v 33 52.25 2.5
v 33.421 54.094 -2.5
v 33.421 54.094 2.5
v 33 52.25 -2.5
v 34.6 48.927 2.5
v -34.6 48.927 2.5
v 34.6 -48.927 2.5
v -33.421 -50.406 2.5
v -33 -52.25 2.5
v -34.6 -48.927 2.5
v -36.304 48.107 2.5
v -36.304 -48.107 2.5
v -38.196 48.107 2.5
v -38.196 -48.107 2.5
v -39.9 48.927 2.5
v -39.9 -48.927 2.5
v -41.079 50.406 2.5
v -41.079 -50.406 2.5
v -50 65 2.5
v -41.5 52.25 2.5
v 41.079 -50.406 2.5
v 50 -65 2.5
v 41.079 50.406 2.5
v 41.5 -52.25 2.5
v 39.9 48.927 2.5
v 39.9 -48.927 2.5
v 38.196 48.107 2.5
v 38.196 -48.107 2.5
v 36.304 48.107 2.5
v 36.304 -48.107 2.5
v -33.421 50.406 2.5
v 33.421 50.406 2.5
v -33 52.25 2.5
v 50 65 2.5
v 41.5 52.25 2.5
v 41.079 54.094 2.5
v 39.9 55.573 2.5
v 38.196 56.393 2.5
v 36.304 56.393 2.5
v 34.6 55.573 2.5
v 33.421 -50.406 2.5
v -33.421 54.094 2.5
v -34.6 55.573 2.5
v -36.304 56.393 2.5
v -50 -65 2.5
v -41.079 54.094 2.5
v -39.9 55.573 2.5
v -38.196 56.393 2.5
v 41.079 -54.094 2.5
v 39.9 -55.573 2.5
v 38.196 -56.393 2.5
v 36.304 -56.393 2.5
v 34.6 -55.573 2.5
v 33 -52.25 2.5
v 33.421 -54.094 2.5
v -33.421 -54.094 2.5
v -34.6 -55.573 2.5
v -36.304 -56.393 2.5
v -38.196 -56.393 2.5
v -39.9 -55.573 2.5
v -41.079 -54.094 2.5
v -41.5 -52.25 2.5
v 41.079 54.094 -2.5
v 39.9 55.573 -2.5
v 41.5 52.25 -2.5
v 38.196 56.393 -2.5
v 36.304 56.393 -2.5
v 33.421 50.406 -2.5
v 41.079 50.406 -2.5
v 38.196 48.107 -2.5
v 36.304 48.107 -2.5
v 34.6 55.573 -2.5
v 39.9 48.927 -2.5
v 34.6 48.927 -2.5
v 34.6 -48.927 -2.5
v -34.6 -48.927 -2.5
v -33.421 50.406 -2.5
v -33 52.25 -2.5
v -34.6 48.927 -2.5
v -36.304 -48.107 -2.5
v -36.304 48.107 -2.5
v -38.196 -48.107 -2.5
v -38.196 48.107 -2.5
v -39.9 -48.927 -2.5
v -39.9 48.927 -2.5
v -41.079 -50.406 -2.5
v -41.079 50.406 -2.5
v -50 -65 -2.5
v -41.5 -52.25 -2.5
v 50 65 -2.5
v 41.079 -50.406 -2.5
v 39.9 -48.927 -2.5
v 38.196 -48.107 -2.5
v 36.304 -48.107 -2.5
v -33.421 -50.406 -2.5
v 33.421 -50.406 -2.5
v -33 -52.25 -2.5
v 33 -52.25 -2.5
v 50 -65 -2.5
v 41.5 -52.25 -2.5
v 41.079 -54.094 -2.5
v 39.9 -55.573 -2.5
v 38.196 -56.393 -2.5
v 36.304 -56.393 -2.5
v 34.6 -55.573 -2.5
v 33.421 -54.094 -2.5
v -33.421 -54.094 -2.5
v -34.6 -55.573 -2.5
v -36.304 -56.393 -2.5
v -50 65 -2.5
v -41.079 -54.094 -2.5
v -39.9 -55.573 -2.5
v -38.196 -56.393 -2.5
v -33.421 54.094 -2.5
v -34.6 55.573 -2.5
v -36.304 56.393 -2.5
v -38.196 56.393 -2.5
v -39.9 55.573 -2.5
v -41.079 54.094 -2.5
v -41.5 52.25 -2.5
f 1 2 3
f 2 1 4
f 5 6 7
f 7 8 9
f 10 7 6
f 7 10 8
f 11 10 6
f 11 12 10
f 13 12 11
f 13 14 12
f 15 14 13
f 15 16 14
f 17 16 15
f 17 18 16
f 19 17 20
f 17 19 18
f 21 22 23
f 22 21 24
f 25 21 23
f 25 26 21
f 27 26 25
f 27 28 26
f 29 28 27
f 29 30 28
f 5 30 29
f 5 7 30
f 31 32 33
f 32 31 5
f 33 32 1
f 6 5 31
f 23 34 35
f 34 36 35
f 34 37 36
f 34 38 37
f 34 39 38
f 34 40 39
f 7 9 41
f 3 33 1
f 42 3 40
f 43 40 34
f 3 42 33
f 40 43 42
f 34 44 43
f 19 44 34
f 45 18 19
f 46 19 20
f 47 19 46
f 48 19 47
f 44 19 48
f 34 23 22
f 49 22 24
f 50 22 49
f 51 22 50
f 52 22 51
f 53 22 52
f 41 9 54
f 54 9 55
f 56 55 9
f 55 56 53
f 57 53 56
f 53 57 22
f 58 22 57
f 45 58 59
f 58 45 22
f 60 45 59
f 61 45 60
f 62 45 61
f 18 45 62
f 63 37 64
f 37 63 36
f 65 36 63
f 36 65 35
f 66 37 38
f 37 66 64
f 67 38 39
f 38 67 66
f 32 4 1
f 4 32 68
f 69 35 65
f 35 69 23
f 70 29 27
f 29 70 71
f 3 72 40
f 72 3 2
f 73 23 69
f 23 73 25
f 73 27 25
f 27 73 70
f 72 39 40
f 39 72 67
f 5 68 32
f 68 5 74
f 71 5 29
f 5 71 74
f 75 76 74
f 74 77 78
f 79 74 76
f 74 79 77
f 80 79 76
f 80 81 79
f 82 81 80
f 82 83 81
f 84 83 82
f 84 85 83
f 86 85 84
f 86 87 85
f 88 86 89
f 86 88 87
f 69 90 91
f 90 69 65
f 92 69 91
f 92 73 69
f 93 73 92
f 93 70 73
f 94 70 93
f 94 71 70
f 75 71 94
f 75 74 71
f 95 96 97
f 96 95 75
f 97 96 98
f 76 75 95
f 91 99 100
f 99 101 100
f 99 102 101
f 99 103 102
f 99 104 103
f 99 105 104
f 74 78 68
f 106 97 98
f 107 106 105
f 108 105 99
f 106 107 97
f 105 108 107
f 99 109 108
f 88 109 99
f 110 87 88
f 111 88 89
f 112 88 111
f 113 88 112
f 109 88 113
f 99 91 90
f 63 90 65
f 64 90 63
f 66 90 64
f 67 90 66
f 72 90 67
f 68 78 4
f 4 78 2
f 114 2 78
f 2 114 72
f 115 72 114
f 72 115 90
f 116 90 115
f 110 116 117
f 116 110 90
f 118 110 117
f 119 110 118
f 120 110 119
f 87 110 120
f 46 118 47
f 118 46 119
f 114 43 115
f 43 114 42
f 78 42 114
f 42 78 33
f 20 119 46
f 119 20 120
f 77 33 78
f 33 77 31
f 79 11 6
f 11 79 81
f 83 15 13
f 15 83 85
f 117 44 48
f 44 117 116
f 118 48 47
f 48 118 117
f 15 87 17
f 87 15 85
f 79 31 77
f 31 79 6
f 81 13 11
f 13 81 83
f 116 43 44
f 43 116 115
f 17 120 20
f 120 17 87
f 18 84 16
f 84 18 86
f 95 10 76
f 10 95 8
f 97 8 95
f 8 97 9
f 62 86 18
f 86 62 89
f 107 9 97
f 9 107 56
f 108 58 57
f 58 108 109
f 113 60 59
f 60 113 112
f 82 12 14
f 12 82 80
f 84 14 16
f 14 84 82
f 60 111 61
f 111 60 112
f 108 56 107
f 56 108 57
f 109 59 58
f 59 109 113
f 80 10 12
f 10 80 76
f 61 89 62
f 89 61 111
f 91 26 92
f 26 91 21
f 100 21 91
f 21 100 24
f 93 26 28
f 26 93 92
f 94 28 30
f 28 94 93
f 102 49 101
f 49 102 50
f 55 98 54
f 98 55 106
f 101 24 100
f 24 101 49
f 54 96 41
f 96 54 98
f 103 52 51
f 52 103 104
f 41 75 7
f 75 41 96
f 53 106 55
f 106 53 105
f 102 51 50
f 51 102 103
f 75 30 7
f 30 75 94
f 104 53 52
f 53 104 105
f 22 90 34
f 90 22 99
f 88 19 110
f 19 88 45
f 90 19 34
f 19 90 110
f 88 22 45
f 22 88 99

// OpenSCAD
// Generated by SolidPython 1.1.3 on 2023-01-09 23:21:47


difference() {
	cube(center = true, size = [100, 130.0000000000, 5]);
	union() {
		translate(v = [37.2500000000, 52.2500000000]) {
			cylinder(center = true, h = 5, r = 4.2500000000);
		}
		translate(v = [-37.2500000000, 52.2500000000]) {
			cylinder(center = true, h = 5, r = 4.2500000000);
		}
		translate(v = [-37.2500000000, -52.2500000000]) {
			cylinder(center = true, h = 5, r = 4.2500000000);
		}
		translate(v = [37.2500000000, -52.2500000000]) {
			cylinder(center = true, h = 5, r = 4.2500000000);
		}
	}
}
/***********************************************
*********      SolidPython code:      **********
************************************************
 
import solid
import numbers
import pudb
from solid.utils import *
import viewscad
import subprocess
import os
import os.path as osp
import math
import sys

chamfer_extrude=solid.import_scad("./chamfer_extrude.scad")
chamfer_extrude=chamfer_extrude.chamfer_extrude
r = viewscad.Renderer(width=800, height=800)

def debug(model,f_name,path="/home/ts/code/projects/mfd/designs/debug"):
    solid.scad_render_to_file(model,osp.join(path,f_name)+".scad")
#generate position list of wells using offset from center
wells_pos_from_center_4 = lambda offset: [[-offset,offset],
                                        [offset, offset],
                                        [-offset, -offset],
                                        [offset, -offset]]
#wells_pos_from_center_2 = lambda offset: [[0,offset],
#                                        [0, -offset]]
wells_pos_from_center_2 = lambda offset: [[offset,0],
                                        [-offset,0]]

def make_well(dims,shape=None,height=None,dxf=False):
    def circle_cylinder():
        if dxf or (height is None):
            well = solid.circle(r=dims, segments=64)
        else:
            well = solid.cylinder(r=dims, h=height, segments=64, center = True)
        return well
    if dims is None:
        sys.exit("radius needs to be a number")
    if isinstance(dims, numbers.Number):
        well =circle_cylinder()
    elif len(dims)==1:
        if isinstance(dims[1], numbers.Number):
            well =circle_cylinder()
        else:
            sys.exit("radius needs to be a number")
    elif len(dims)==2:
        well = solid.square(dims,center = True)
    elif len(dims)==3:
        well = solid.cube(dims, center = True)
    return well

def wells_top_bottom(center_gap,device_dims=None,shape=None,height=None, positions = None, dxf = False):
    well_shape = make_well(device_dims,shape=shape,height=height,dxf=dxf)
    wells = []
    if positions is None:
        offset = radius+radius/2.0
        positions = wells_pos_from_center_2(offset)
    if dxf or (height is None):
        height = 0
    for position in positions:
        if dxf:
            wells.append(solid.translate([position[0],position[1]])(well_shape))
        else:
            wells.append(solid.translate([position[0],position[1],height/2.0])(well_shape))
    return  union()(*wells)

#place wells in four corners 
def four_corner(radius,height=None, positions = None, dxf = False):
    #if well pos not specified set
    #to equally spaced by half radius
    if positions is None:
        offset = radius+radius/2.0
        positions = wells_pos_from_center_4(offset)
    if dxf or (height is None):
        height = 0
    #make wells at positions with specified radius and height
    wells = []
    for position in positions:
        #make circle if making dxf
        if dxf:
            well_shape = solid.circle(r=radius, segments=64)
            well_shape = solid.translate([position[0],position[1]])(well_shape)
        #if stl make cylinder
        else:
            well_shape = solid.cylinder(r=radius, h=height, segments=64, center = True)
            well_shape = solid.translate([position[0],position[1],height/2.0])(well_shape)
        wells.append(well_shape)
    return  union()(*wells)

#generate channels 
def make_channels(length,width,height=0,num_chans=1,max_chans=None,spacing=None, dxf = False,
                  rotate_channels=False):
    if dxf or (height is None):
        height = 0
    #if channel gap not defined, is equal to
    if spacing is None: spacing = width
    #calculate number of channels if fitting max num within given width
    if not max_chans is None:
        import math
        num_chans = math.floor((max_chans-spacing)/(width+spacing))
    #get total width of channel section  
    total_width = (width*num_chans)+(spacing*(num_chans-1))

    #make template channel
    #if rotate_channels: width, length = length, width
    if dxf:
        channel_t = solid.square([length,width],center = True)
    else:
        channel_t = solid.cube([length,width,height], center = True)

    #if number channels is even, offset the first channel to center its gap
    if num_chans % 2 == 0: centering = -(width/2.0+spacing/2.0)
    else: centering = 0
    #move template channel up to align bottom at z = 0 
    #and offset center if necessary
    if dxf:
        channel_t = solid.translate([0,centering])(channel_t)
    else:
        channel_t = solid.translate([0,centering,height/2.0])(channel_t)

    #if rotate_channels: length,width = width,length
    #start making the channels
    channels = []
    for i in range(num_chans):
        #if i=0 there is no translation
        #if i=1, we make the first channel adjacent to second
        direction = i

        #if i>=1, we add channels alternating left and right
        if i >= 1:
            direction = -(i/2.0)
            if i % 2 == 1: direction = (-direction)+0.5
                
        #make channel at right position and add it to channel list
        translation_coords = [0,direction*(width+spacing)]
        #if rotate_channels: translation_coords = [direction*(width+spacing),0]
        if dxf:
            channel = solid.translate(translation_coords)(channel_t)
        else:
            channel = solid.translate([*translation_coords,0])(channel_t)
        channels.append(channel)
    
    #group all channels as one object
    channels = union()(*channels)
    #compute the x,y,z dimensions in order to pass as arguments 
    #for construction of other parts of device (such as the chambers)
    measurements = {'x':(length/2.0,-length/2.0),
                    'y':(total_width/2.0,-total_width/2.0)}
    if not dxf:
        measurements['z'] = (height,0)
    if rotate_channels:
        channels = solid.rotate(90)(channels)
        measurements['x'],measurements['y']=measurements['y'],measurements['x']
    return channels,measurements

def make_chambers(msrs,height=None,extra=0,len_until=None,width=None, dxf = False):
    #computes x,y,z length
    total = lambda x : abs(x[0]) + abs(x[1])
    
    #if specific height if specified
    #otherwise use same height as channels
    if dxf:
        pass
    elif not height is None:
        msrs['z'] = (height,0)
    else:
        msrs['z'] = (0,0)
        
    #make copy of measurements from channels to modify chamber dimensions 
    #and add length to chambers as specified
    chamber_dims = msrs.copy()
    #calculate length of chamber to reach specified offset
    if not len_until is None:
        chamber_len = len_until-(msrs['x'][0])
    #or add specified length to channel length (if not specified, adds 0)
    else:
        chamber_len = msrs['x'][0]+extra
    #set the chamber length based 
    chamber_dims['x'] = (chamber_len/2.0,-(chamber_len/2.0))
    #compute final dimensions of chamber
    if not width is None:
        chamber_dims['y'] = (width/2.0,-width/2.0)
    chamber_dims = [total(size) for size in chamber_dims.values()]
        
    #calculate chamber translation offset to place adjacent to channels
    chamber_trslt = msrs['x'][0]+(chamber_len/2.0)
    #compute chamber translation coordinates to align with channels
    #x = 1 moves chamber above channels
    #x = -1 moves chamber below channels
    if dxf:
        trslt = lambda x : [x*(chamber_trslt),0]
    else:
        trslt = lambda x : [x*(chamber_trslt),0,msrs['z'][0]/2.0]
    
    #function to make chamber at top or at bottom 
    if dxf:
        move = lambda x : solid.translate(trslt(x))(solid.square(chamber_dims, center = True) )
    else:
        move = lambda x : solid.translate(trslt(x))(solid.cube(chamber_dims,center = True))
    #make top and bottom chambers and return them as grouped
    top = move(1)
    bottom = move(-1)
    #chambers=solid.rotate(90)(solid.union()(top,bottom))
    chambers=(solid.union()(top,bottom))

    return chambers

#create alignment features 
def alignment_features(unit,dims,grid_size, mask_size = None, alignment = "hollow", units_from_center = (2.5,2.5), corner_len=None):
    width = grid_size[0]*dims[0]
    length = grid_size[1]*dims[1]
    if mask_size is None and corner_len is None:
        corner_len = (dims[0] + dims[1]) /2 / 8
    corner = lambda thickness_div : solid.union()( solid.square([corner_len,corner_len/thickness_div],center=False), solid.square([corner_len/thickness_div,corner_len],center=False) )
    
    def make_full(thickness_div):
        thickness = corner_len/thickness_div
        tr = solid.translate([0, 0, 0 ])(solid.rotate(180)(corner(thickness_div)))
        tr = solid.translate([thickness/2,thickness/2,0])(tr)
        bl = solid.translate([0, 0, 0 ])(solid.rotate(0)(corner(thickness_div)))
        bl = solid.translate([-thickness/2,-thickness/2,0])(bl)
        return solid.union()(tr,bl)
    
    def make_hollow(thickness_div):
        thickness = corner_len/(thickness_div/2)
        inner = make_full(thickness_div)
        outer = make_full(thickness_div/2)
        hollow = outer - inner 
        return hollow
    
    center = (width /2 , length/2)
    mask_pos = lambda x,y : (center[0] + x*(float(units_from_center[0])*dims[0]), center[1] + y*(float(units_from_center[1])*dims[1]))
    positions = []
    positions.append(mask_pos(1,0))
    positions.append(mask_pos(0,1))
    positions.append(mask_pos(-1,0))
    positions.append(mask_pos(0,-1))
    make_mask = lambda mtype : make_hollow(8) if mtype == "hollow" else make_full(8)
    masks = [ solid.translate([*position,0])(make_mask(alignment)) for position in positions]
    
    solid.scad_render_to_file(solid.union()(*masks),"./designs/open_chamber/masks.scad")
    #return unit - solid.union()(*masks)
    return solid.union()(*masks,unit)

def create_outline(thickness, array, dims, grid_size,):
    width = grid_size[0]*dims[0] + thickness *2
    length = grid_size[1]*dims[1] + thickness *2
    outer = solid.translate([-thickness, -thickness,0])(solid.square([width, length]))
    return outer-array

def create_wall(wall_thickness, outline_thickness, dims, grid_size, wall_height = 2000, dxf = False):
    inner_width = grid_size[0]*dims[0] + outline_thickness *2
    inner_length = grid_size[1]*dims[1] + outline_thickness *2
    outer_width = inner_width + wall_thickness * 2
    outer_length = inner_length + wall_thickness * 2
    outer_pos_x = -outline_thickness-wall_thickness
    outer_pos_y = -outline_thickness-wall_thickness
    inner_pos_x = -outline_thickness
    inner_pos_y = -outline_thickness
    if dxf:
        inner_wall = solid.translate([inner_pos_x,
                                      inner_pos_y,
                                      0])(solid.square([inner_width, inner_length]))
        outer_wall = solid.translate([outer_pos_x,
                                      outer_pos_y,
                                      0])(solid.square([outer_width, outer_length]))

        return outer_wall-inner_wall
    else:
        inner_wall = solid.translate([inner_pos_x,
                                      inner_pos_y,
                                      0])(solid.cube([inner_width, inner_length,wall_height]))
        outer_wall = solid.translate([outer_pos_x,
                                      outer_pos_y,
                                      0])(solid.cube([outer_width, outer_length,wall_height]))

        return outer_wall-inner_wall, {'wall_height': wall_height,
                                       'wall_thickness': wall_thickness,
                                       'inner_width':inner_width,
                                       'inner_length': inner_length,
                                       'outer_width': outer_width,
                                       'outer_length': outer_length,
                                       'outer_pos_x' : outer_pos_x,
                                       'outer_pos_y' : outer_pos_y,
                                       'inner_pos_x' : inner_pos_x,
                                       'inner_pos_y' : inner_pos_y}

def create_thicker_wall(wall_thickness, outer_wall_offset, wall_dims, dims, grid_size, height_start = .2, height_end=2, dxf = False):
    addon_wall,thicker_wall_dims = create_wall(wall_thickness, outer_wall_offset, dims, grid_size, wall_height=height_end-height_start, dxf = False)
    addon_wall = solid.translate([0,0,height_start])(addon_wall)

    thicker_wall_dims['wall_height'] = height_end
    thicker_wall_dims['wall_thickness'] = wall_dims['wall_thickness'] + wall_thickness
    return addon_wall, thicker_wall_dims
 
def add_lock_to_wall(wall,wall_dims,y_offset = 0,cut_ratio=0.7,L_length=3, gap_ratio=0.05, axis="x",width_ratio=1/2):
    # Makes L shape
    def make_L(max_length,length_thickness,max_width,width_thickness,height,y_offset):
        length = solid.cube([max_length,length_thickness,height])
        width = solid.cube([width_thickness,max_width,height])
        width = solid.translate([max_length-(width_thickness),0,0])(width)
        L = solid.union()(width,length)
        debug(L,"L")
        if axis == "x":
            L = solid.rotate(-90)(L)
            L = solid.translate([0,max_length,0])(L)
        else:
            L = solid.rotate(-180)(L)
            L = solid.translate([max_length,max_width,0])(L)
        return solid.translate([0,0,y_offset])(L)
    
    lock_length = L_length
    lock_width = wall_dims['wall_thickness']*width_ratio
    lock_length_thickness = lock_width/2
    lock_width_thickness = lock_width/2
    L_lock = make_L(lock_length,lock_length_thickness,lock_width,lock_width_thickness, wall_dims['wall_height']-y_offset, y_offset)
    
    margin_space = lock_length - lock_length*(1-gap_ratio)
    key_length = lock_length-margin_space
    key_length_thickness = lock_length_thickness-(margin_space*2)
    key_width = lock_width-(margin_space*2)
    key_width_thickness = lock_width_thickness-(margin_space*2)
    L_key = make_L(key_length,key_length_thickness,key_width,key_width_thickness, wall_dims['wall_height']-y_offset, y_offset)
    L_key = solid.translate([margin_space,margin_space,0])(L_key)
    L = solid.union()(L_lock,L_key)
    debug(L,"L")
    
    #Make cube to be used as negative to split frame in a half
    #Can choose if making left or right negative, specify ratio of split
    def make_negative(right,cut_ratio):
        if axis == "x":
            if right:
                length = wall_dims['outer_length']*(1-cut_ratio)
                pos_x = wall_dims['outer_pos_x']+(wall_dims['outer_length']*cut_ratio)
            else:
                length = wall_dims['outer_length']*(cut_ratio)
                pos_x = wall_dims['outer_pos_x'] 
            negative = solid.cube([wall_dims['outer_width'],length, wall_dims['wall_height']])
            negative = solid.translate([wall_dims['outer_pos_y'],pos_x,0])(negative)
        else:
            if right:
                length = wall_dims['outer_width']*(1-cut_ratio)
                pos_x = wall_dims['outer_pos_y']+(wall_dims['outer_width']*cut_ratio)
            else:
                length = wall_dims['outer_width']*(cut_ratio)
                pos_x = wall_dims['outer_pos_y'] 
            negative = solid.cube([length,wall_dims['outer_length'], wall_dims['wall_height']])
            negative = solid.translate([pos_x,wall_dims['outer_pos_x'],0])(negative)
        return negative, pos_x, length 
                      
    #Make negatives
    negative_right, right_half_pos_x, right_half_length = make_negative(True,cut_ratio)
    negative_left, left_half_pos_x, right_half_length = make_negative(False,cut_ratio)
    #Make halves
    left_half = solid.difference()(wall,negative_right)
    right_half = solid.difference()(wall,negative_left)
    def place_L(L, L_length,L_width):
        #Place L on top wall       
        offset_to_center = (wall_dims['wall_thickness']-L_width)/2
        if axis == "x":
            y_pos_top = (wall_dims['outer_pos_y'] +
                    wall_dims['outer_width'] - 
                    L_width - offset_to_center)
            top_L = solid.translate([y_pos_top,
                                     right_half_pos_x-(L_length),
                                     0])(L)
            #Place L on bottom wall       
            y_pos_bottom = wall_dims['outer_pos_y']+offset_to_center
            bottom_L = solid.translate([y_pos_bottom,
                                        right_half_pos_x-L_length,
                                        0])(L)
        else:
            y_pos_top = (wall_dims['outer_pos_x'] +
                    wall_dims['outer_length'] -
                    (L_width+offset_to_center))
            top_L = solid.translate([right_half_pos_x-L_length,
                                     y_pos_top,
                                     0])(L)
            #Place L on bottom wall       
            y_pos_bottom = wall_dims['outer_pos_y']+offset_to_center
            bottom_L = solid.translate([right_half_pos_x-L_length,
                                        y_pos_bottom,
                                        0])(L)
        return bottom_L, top_L
    #Make complimentary L pieces through union and differences
    #Make Lock
    bottom_L_lock, top_L_lock = place_L(L_lock,L_length,lock_width)
    left_half = solid.difference()(left_half,bottom_L_lock)
    left_half = solid.difference()(left_half,top_L_lock)
    #Make Key
    bottom_L_key, top_L_key = place_L(L_key,L_length,lock_width)
    right_half = solid.union()(right_half,bottom_L_key)
    right_half = solid.union()(right_half,top_L_key)
    return left_half, right_half


#build a row x col grid of containment units
def make_unit_array(unit,dims,grid_size, dxf = False, alignment = None, mask_size = None,
                    units_from_center = None,alignment_offset=None, alignment_mark_size=1):
    units = []
    for col in range(grid_size[1]):
        for row in range(grid_size[0]):
            if dxf:
                units.append(solid.translate([row*dims[0],col*dims[1]])(unit))
            else:
                units.append(solid.translate([row*dims[0],col*dims[1],dims[2]/2.0])(unit))
    array = solid.union()(*units)
    if (not alignment is None) and dxf:
        if not alignment_offset is None:
            array = solid.translate([alignment_offset[0],alignment_offset[1]])(array)
        array = alignment_features(array,dims, grid_size, alignment = alignment, mask_size = None, units_from_center = units_from_center,corner_len=alignment_mark_size)
        if not alignment_offset is None:
            array = solid.translate([-alignment_offset[0],-alignment_offset[1]])(array)
    return array


def make_taylor(wells_pos = wells_pos_from_center_4(2.25), well_rad = 1.5 ,
                well_height = 2, chan_w = 0.01, chan_l = 1, chan_h = 0.010 ,
                chan_gap = 0.040, max_chans = None,num_chans=100, chamber_height  = 0.100,
                columns = 1, rows = 1, chamber_len_until=2.25, add_channels = True, add_wells = True, 
                add_chambers = True, save_path = "./", alignment = None, units_from_center = 2,
                mask_size = None, render_stl = False, outline_thickness = 0.050, dxf = True,
                wall_height = 15, wall_thickness = 0.95, casing_x=9, casing_y=9, casing_z=0,rotate_units=0):

    dims = [casing_x, casing_y, casing_z]
    wells = four_corner(well_rad,well_height, dxf = dxf, positions = wells_pos)
    debug(wells,"wells")
    channels, msrs = make_channels(chan_l,chan_w,chan_h,dxf=dxf, spacing = chan_gap, max_chans=max_chans,num_chans=num_chans)
    debug(channels,"channels")
    chambers = make_chambers(msrs,dxf = dxf, height=chamber_height,len_until=chamber_len_until)
    debug(chambers,"chambers")

    #add together and render
    device_parts = []
    if add_channels:
        device_parts.append(channels)
    if add_wells:
        device_parts.append(wells)
    if add_chambers:
        device_parts.append(chambers)
    device=union()(*device_parts)
    device = rotate(rotate_units)(device)

    device=solid.translate([dims[0]/2.0,dims[1]/2.0,0])(device)
    channels = rotate(rotate_units)(channels)
    channels=solid.translate([dims[0]/2,dims[1]/2,0])(channels)
    chambers_wells = union()(wells,chambers)
    chambers_wells = rotate(rotate_units)(chambers_wells)
    chambers_wells=solid.translate([dims[0]/2,dims[1]/2,0])(chambers_wells)

    file_name = str(rows)+'x'+str(columns)+'_units_'
    grid_size = [rows,columns]

    if alignment:
        alignment="full"
    device = make_unit_array(device,dims,grid_size, dxf=dxf, alignment = alignment,
                                 units_from_center = units_from_center)
    channels = make_unit_array(channels,dims,grid_size, dxf=dxf, alignment = alignment,
                                 units_from_center = units_from_center)
    if alignment=="full":
        alignment="hollow"

    chambers_wells = make_unit_array(chambers_wells,dims,grid_size, dxf=dxf, alignment = alignment,
                                 units_from_center =units_from_center)

    def save_model(model,prefix):
        model_fname = os.path.abspath(save_path+prefix+"_"+file_name+".scad")
        solid.scad_render_to_file(model,model_fname)
        return model_fname

    wells_fname = save_model(wells,"wells")
    channels_fname = save_model(channels,"channels")
    device_fname = save_model(device,"device")
    chambers_wells_fname = save_model(chambers_wells,"chambers_wells")
    return (chambers_wells,chambers_wells_fname), (channels,channels_fname), (device,device_fname)

def make_device(design='open',rows=8,columns=6,wells_pos = 4.5,well_offset=3.2, well_rad=3.2,well_height=0.1,
                chan_l=1,chan_w=0.01,chan_h=0.01,chan_gap=0.015,num_chans=101,dxf=True,save_path="./designs/open_chamber/",
                casing_x=9.0,casing_y=18.0,casing_z=0,rotate_units=90,units_from_center=(3,1),chamber_len_until=4.5,
                chamber_width=None,alignment=True, add_wells=True, add_channels=True,add_chambers=True):

    dims = [casing_x, casing_y, casing_z]
    if design == "open":
        wells_pos=wells_pos_from_center_2(wells_pos)
        wells = wells_top_bottom(well_offset*2,device_dims=well_rad,height=well_height, dxf = dxf, positions = wells_pos)
    elif design == "closed":
        wells_pos=wells_pos_from_center_4(wells_pos)
        debug(wells,"wells")
        wells = four_corner(well_offset,well_heightdevice_dims=well_rad, dxf = dxf, positions = wells_pos)
    else:
        print(design+" is not a valid design.\n Choose valid design: 'open' or 'closed'")
        exit()
    wells = rotate(rotate_units)(wells)
    wells=solid.translate([dims[0]/2,dims[1]/2,0])(wells)
    debug(wells,"wells")

    channels, msrs = make_channels(chan_l,chan_w,chan_h,dxf=dxf, spacing = chan_gap, num_chans=num_chans,rotate_channels=False)
    channels = rotate(rotate_units)(channels)
    channels=solid.translate([dims[0]/2,dims[1]/2,0])(channels)

    chambers=make_chambers(msrs,height=None,extra=0,len_until=chamber_len_until, width=chamber_width,dxf = dxf)
    chambers = rotate(rotate_units)(chambers)
    chambers=solid.translate([dims[0]/2,dims[1]/2,0])(chambers)

    device_parts = []
    if add_channels:
        device_parts.append(channels)
    if add_wells:
        device_parts.append(wells)
    if add_chambers:
        device_parts.append(chambers)
    device = union()(*device_parts)
    #device = rotate(rotate_units)(device)
    #device=solid.translate([dims[0]/2.0,dims[1]/2.0,0])(device)

    chambers_wells = []
    if add_chambers:
        chambers_wells.append(chambers)
    if add_wells:
        chambers_wells.append(wells)
    chambers_wells = union()(*chambers_wells)
    #chambers_wells = union()(wells,chambers)
    #chambers_wells = rotate(rotate_units)(chambers_wells)
    #chambers_wells=solid.translate([dims[0]/2,dims[1]/2,0])(chambers_wells)

    file_name = str(rows)+'x'+str(columns)+'_units_'

    grid_size = [rows,columns]
    if alignment:
        alignment="full"
    device = make_unit_array(device,dims,grid_size, dxf=dxf, alignment = alignment,
                                 units_from_center = units_from_center)
    channels = make_unit_array(channels,dims,grid_size, dxf=dxf, alignment = alignment,
                                 units_from_center = units_from_center)
    if alignment=="full":
        alignment="hollow"

    chambers_wells = make_unit_array(chambers_wells,dims,grid_size, dxf=dxf, alignment = alignment,
                                 units_from_center =units_from_center)

    def save_model(model,prefix):
        model_fname = os.path.abspath(save_path+prefix+"_"+file_name+".scad")
        solid.scad_render_to_file(model,model_fname)
        return model_fname

    wells_fname = save_model(wells,"wells")
    channels_fname = save_model(channels,"channels")
    device_fname = save_model(device,"device")
    chambers_wells_fname = save_model(chambers_wells,"chambers_wells")
    return (chambers_wells,chambers_wells_fname), (channels,channels_fname), (device,device_fname)


def make_open_chamber(rows=8,columns=6,wells_pos = wells_pos_from_center_2(4.5), well_rad=3.2,well_height=0.1,
                      chan_l=1,chan_w=0.01,chan_h=0.01,chan_gap=0.015,num_chans=101,dxf=True,save_path="./designs/open_chamber/",
                      casing_x=9.0,casing_y=18.0,casing_z=0,rotate_units=90,units_from_center=(3,1),chamber_len_until=4.5,
                      chamber_width=None,alignment=True, add_wells=True, add_channels=True,add_chambers=True):

    dims = [casing_x, casing_y, casing_z]
    wells = wells_top_bottom(well_rad,height=well_height, dxf = dxf, positions = wells_pos)
    channels, msrs = make_channels(chan_l,chan_w,chan_h,dxf=dxf, spacing = chan_gap, num_chans=num_chans,rotate_channels=False)
    chambers=make_chambers(msrs,height=None,extra=0,len_until=chamber_len_until, width=chamber_width,dxf = dxf)
    debug(chambers,"chambers")
    device_parts = []
    if add_channels:
        device_parts.append(channels)
    if add_wells:
        device_parts.append(wells)
    if add_chambers:
        device_parts.append(chambers)
    device = union()(*device_parts)
    device = rotate(rotate_units)(device)
    device=solid.translate([dims[0]/2.0,dims[1]/2.0,0])(device)
    channels = rotate(rotate_units)(channels)
    channels=solid.translate([dims[0]/2,dims[1]/2,0])(channels)
    chambers_wells = union()(wells,chambers)
    chambers_wells = rotate(rotate_units)(chambers_wells)
    chambers_wells=solid.translate([dims[0]/2,dims[1]/2,0])(chambers_wells)

    file_name = str(rows)+'x'+str(columns)+'_units_'

    grid_size = [rows,columns]
    if alignment:
        alignment="full"
    device = make_unit_array(device,dims,grid_size, dxf=dxf, alignment = alignment,
                                 units_from_center = units_from_center)
    channels = make_unit_array(channels,dims,grid_size, dxf=dxf, alignment = alignment,
                                 units_from_center = units_from_center)
    if alignment=="full":
        alignment="hollow"

    chambers_wells = make_unit_array(chambers_wells,dims,grid_size, dxf=dxf, alignment = alignment,
                                 units_from_center =units_from_center)

    def save_model(model,prefix):
        model_fname = os.path.abspath(save_path+prefix+"_"+file_name+".scad")
        solid.scad_render_to_file(model,model_fname)
        return model_fname

    wells_fname = save_model(wells,"wells")
    channels_fname = save_model(channels,"channels")
    device_fname = save_model(device,"device")
    chambers_wells_fname = save_model(chambers_wells,"chambers_wells")
    return (chambers_wells,chambers_wells_fname), (channels,channels_fname), (device,device_fname)

def to_dxf(scad_path):
    dxf_path = scad_path.replace(".scad",".dxf")
    subprocess.call(["openscad", "-o", dxf_path, scad_path])
    import ezdxf
    temp_dxf = ezdxf.readfile(dxf_path)
    temp_dxf.saveas(dxf_path)

#def make_walls(diameter,thickness,grid_size,dims,height=20,segments=256,make_inner=True):
#    wafer_wall_out = solid.cylinder(r=diameter/2,h=height, segments=segments)
#    wafer_wall_in = solid.cylinder(r=(diameter/2-thickness),h=height, segments=segments)
#    wafer_wall = solid.difference()(wafer_wall_out,wafer_wall_in)
#    wafer_wall = solid.translate([grid_size[1]*dims[1]/2.0,grid_size[0]*dims[0]/2.0])(wafer_wall)
#
#    vertical_wall_length = grid_size[1]*dims[1]
#    horizontal_wall_length = grid_size[0]*dims[0]
#    vertical_wall = solid.cube([vertical_wall_length,thickness,height],center = True)
#    vertical_wall = solid.translate([vertical_wall_length/2,0,height/2])(vertical_wall)
#    horizontal_wall = solid.cube([thickness,horizontal_wall_length,height],center = True)
#    horizontal_wall = solid.translate([0,vertical_wall_length/2,height/2])(horizontal_wall)
#    walls = []
#    walls.append(horizontal_wall)
#    walls.append(vertical_wall)
#    for col in range(grid_size[1]):
#        if col == grid_size[1]-1: 
#            walls.append(solid.translate([0,(col+1)*dims[1]])(vertical_wall))
#        elif col > 0 and col < grid_size[1]-1 and make_inner==True:
#            walls.append(solid.translate([0,(col+1)*dims[1]])(vertical_wall))
#    for row in range(grid_size[0]):
#        if row == grid_size[0]-1: 
#            walls.append(solid.translate([(row+1)*dims[0],0])(horizontal_wall))
#        elif row > 0 and row < grid_size[0]-1 and make_inner==True:
#            walls.append(solid.translate([(row+1)*dims[0],0])(horizontal_wall))
#    walls = union()(*walls)
#    wafer_walls = union()(walls,wafer_wall)
#    return walls,wafer_wall,wafer_walls

def make_walls(diameter,thickness,grid_size,dims,height=20,segments=256,make_inner=True,padx=0,pady=0):
    wafer_wall_out = solid.cylinder(r=diameter/2,h=height, segments=segments)
    wafer_wall_in = solid.cylinder(r=(diameter/2-thickness),h=height, segments=segments)
    wafer_wall = solid.difference()(wafer_wall_out,wafer_wall_in)
    wafer_wall = solid.translate([grid_size[1]*dims[1]/2.0,grid_size[0]*dims[0]/2.0])(wafer_wall)

    vertical_wall_length = grid_size[0]*dims[0]+padx
    horizontal_wall_length = grid_size[1]*dims[1]+pady
    vertical_wall = solid.cube([vertical_wall_length,thickness,height],center = True)
    vertical_wall = solid.translate([vertical_wall_length/2-pady/2,-padx/2,height/2])(vertical_wall)
    horizontal_wall = solid.cube([thickness,horizontal_wall_length,height],center = True)
    horizontal_wall = solid.translate([-pady/2,horizontal_wall_length/2-padx/2,height/2])(horizontal_wall)
    walls = []
    walls.append(horizontal_wall)
    walls.append(vertical_wall)
    for col in range(grid_size[1]):
        if col == grid_size[1]-1: 
            walls.append(solid.translate([0,(col+1)*dims[1]+pady])(vertical_wall))
        elif col > 0 and col < grid_size[1]-1 and make_inner==True:
            walls.append(solid.translate([0,(col+1)*dims[1]])(vertical_wall))
    for row in range(grid_size[0]):
        if row == grid_size[0]-1: 
            walls.append(solid.translate([(row+1)*dims[0]+padx,0])(horizontal_wall))
        elif row > 0 and row < grid_size[0]-1 and make_inner==True:
            walls.append(solid.translate([(row+1)*dims[0],0])(horizontal_wall))
    walls = union()(*walls)
    wafer_walls = union()(walls,wafer_wall)
    return walls,wafer_wall,wafer_walls

def save_model(model,base_path,base_name,dxf=True):
    if not os.path.exists(base_path):
        os.makedirs(base_path)
    dxf_path=osp.join(base_path,base_name+".scad")
    solid.scad_render_to_file(model,osp.join(dxf_path))
    if dxf:
        to_dxf(dxf_path)

def make_wafer(diameter,flat_len,thickness):
    wafer = solid.cylinder(r1=diameter/2,r2=diameter/2,h=thickness,segments=512,)()
    x_start_flat=(flat_len/2)
    y_start_flat = math.sqrt(((diameter/2)**2) - (x_start_flat**2) )
    height_delete_flat=diameter/2-y_start_flat
    flat_delete = solid.cube([flat_len,height_delete_flat,thickness],center=False)()
    flat_delete = solid.translate([-flat_len/2,y_start_flat,0])(flat_delete)
    wafer = solid.difference()(wafer,flat_delete)
    wafer = solid.rotate(90)(wafer)
    return wafer

def add_wafer_to_mask(wafer_size,flat_len,mask,grid_size,dims,wafer_line_thickness=0.1,outer_mask_thickness=5,alignment_offset=None):
    def make_wafer_mask(wafer_size,flat_len):
        wafer_mask = make_wafer(wafer_size,flat_len,1)
        wafer_mask = solid.projection()(wafer_mask)
        wafer_mask = solid.translate([grid_size[0]*dims[0]/2.0,grid_size[1]*dims[1]/2.0])(wafer_mask)
        if not alignment_offset is None:
            wafer_mask = solid.translate([-alignment_offset[0],-alignment_offset[1]])(wafer_mask)
        return wafer_mask

    inner_wafer_line_mask = make_wafer_mask(wafer_size-wafer_line_thickness/2,flat_len)
    outer_wafer_line_mask = make_wafer_mask(wafer_size+wafer_line_thickness/2,flat_len)
    outer_wafer_mask = make_wafer_mask(wafer_size+outer_mask_thickness,flat_len)
    outer_wafer_mask = solid.difference()(outer_wafer_mask,outer_wafer_line_mask)
    wafer_mask = solid.union()(outer_wafer_mask,inner_wafer_line_mask)

    return solid.difference()(wafer_mask,mask)

def make_posts(post_shape,post_height):
    posts = solid.linear_extrude(height=post_height)(post_shape)
    return posts

def make_wafer_empty(diameter,flat_len,thickness,margin,notch_len=20,notch_height=5,oversize=1.01):
    diameter*=oversize
    flat_len*=oversize
    wafer = make_wafer(diameter,flat_len,thickness)
    holder = solid.cylinder(r1=diameter/2+margin,r2=diameter/2+margin,h=thickness,segments=512)()
    holder = solid.difference()(holder,wafer)

    x_start_flat=(flat_len/2)
    y_start_flat = math.sqrt(((diameter/2)**2) - (x_start_flat**2) )
    height_delete_flat=diameter/2-y_start_flat
    notch = solid.cube([notch_len,notch_height,thickness],center=False)()
    notch = solid.translate([-notch_len/2,y_start_flat,0])(notch)
    notch = solid.rotate(90)(notch)
    return solid.difference()(holder,notch)

def wafer_print_calibration(diameter,thickness,height,z_offset):
    circles = []
    radii = []
    radii.append(diameter/2.0*0.8)
    radii.append(diameter/2.0*0.6)
    radii.append(diameter/2.0*0.4)
    radii.append(diameter/2.0*0.2)
    for radius in radii:
        inner = solid.cylinder(r1=radius-(thickness/2.0),r2=radius-(thickness/2.0),h=thickness,segments=512,)()
        outer = solid.cylinder(r1=radius+(thickness/2.0),r2=radius+(thickness/2.0),h=thickness,segments=512,)()
        diff = solid.difference()(outer,inner)
        circles.append(diff)
    circles = solid.union()(*circles)
    circles = solid.translate([0,0,z_offset])(circles)
    return circles

def make_rack(wells,dims,grid_size,alignment_offset,rack_x,rack_y,rack_thickness,bolt_width,add_bolts=True):

    #get X and Y dimensions of gride of pipette tips
    X_len = dims[0]*grid_size[0]
    Y_len = dims[1]*grid_size[1]
    #make rack
    rack = solid.cube([rack_x,rack_y,rack_thickness],center=True)

    if add_bolts:
    #add bolt holes
        bolt_hole=solid.cylinder(r=bolt_width/2,h=rack_thickness,center=True)()
        bolt_holes = []
        bolt_holes.append(solid.translate([rack_x/2-1.5*bolt_width,rack_y/2-1.5*bolt_width])(bolt_hole))
        bolt_holes.append(solid.translate([-rack_x/2+1.5*bolt_width,rack_y/2-1.5*bolt_width])(bolt_hole))
        bolt_holes.append(solid.translate([-rack_x/2+1.5*bolt_width,-rack_y/2+1.5*bolt_width])(bolt_hole))
        bolt_holes.append(solid.translate([rack_x/2-1.5*bolt_width,-rack_y/2+1.5*bolt_width])(bolt_hole))
        bolt_holes = solid.union()(*bolt_holes)
        rack=solid.difference()(rack,bolt_holes)
    rack_support = rack

    #center rack with pipette holes
    rack = solid.translate([0,0,rack_thickness/2])(rack)
    rack = solid.translate([X_len/2,Y_len/2])(rack)
    rack = solid.translate([-alignment_offset[0],-alignment_offset[1]])(rack)
    wells = solid.linear_extrude(height=rack_thickness)(wells)
    rack = solid.difference()(rack,wells)
    return rack, rack_support

def make_pillar(wells,dims,grid_size,alignment_offset,rack_x,rack_y,pillar_height,rack_thickness,bolt_width,add_bolts=True,taper_angle=1,bolt_position_corner=1.5):

    #get X and Y dimensions of gride of pipette tips
    X_len = dims[0]*grid_size[0]
    Y_len = dims[1]*grid_size[1]
    #make rack
    rack = solid.cube([rack_x,rack_y,rack_thickness],center=True)
    
    if add_bolts:
    #add bolt holes
        bolt_hole=solid.cylinder(r=bolt_width/2,h=rack_thickness,center=True)()
        bolt_holes = []
        bolt_holes.append(solid.translate([rack_x/2-bolt_position_corner*bolt_width,rack_y/2-bolt_position_corner*bolt_width])(bolt_hole))
        bolt_holes.append(solid.translate([-rack_x/2+bolt_position_corner*bolt_width,rack_y/2-bolt_position_corner*bolt_width])(bolt_hole))
        bolt_holes.append(solid.translate([-rack_x/2+bolt_position_corner*bolt_width,-rack_y/2+bolt_position_corner*bolt_width])(bolt_hole))
        bolt_holes.append(solid.translate([rack_x/2-bolt_position_corner*bolt_width,-rack_y/2+bolt_position_corner*bolt_width])(bolt_hole))
        bolt_holes = solid.union()(*bolt_holes)
        rack=solid.difference()(rack,bolt_holes)
    rack_support = rack

    #center rack with pipette holes
    #rack = solid.translate([0,0,-rack_thickness])(rack)
    rack = solid.translate([X_len/2,Y_len/2])(rack)
    rack = solid.translate([-alignment_offset[0],-alignment_offset[1]])(rack)
    if not taper_angle == 0:
        wells=chamfer_extrude(pillar_height,taper_angle,segments=20)(wells)
    else:
        wells = solid.linear_extrude(height=pillar_height)(wells)
    rack = solid.union()(rack,wells)
    return rack, rack_support









 
 
************************************************/
